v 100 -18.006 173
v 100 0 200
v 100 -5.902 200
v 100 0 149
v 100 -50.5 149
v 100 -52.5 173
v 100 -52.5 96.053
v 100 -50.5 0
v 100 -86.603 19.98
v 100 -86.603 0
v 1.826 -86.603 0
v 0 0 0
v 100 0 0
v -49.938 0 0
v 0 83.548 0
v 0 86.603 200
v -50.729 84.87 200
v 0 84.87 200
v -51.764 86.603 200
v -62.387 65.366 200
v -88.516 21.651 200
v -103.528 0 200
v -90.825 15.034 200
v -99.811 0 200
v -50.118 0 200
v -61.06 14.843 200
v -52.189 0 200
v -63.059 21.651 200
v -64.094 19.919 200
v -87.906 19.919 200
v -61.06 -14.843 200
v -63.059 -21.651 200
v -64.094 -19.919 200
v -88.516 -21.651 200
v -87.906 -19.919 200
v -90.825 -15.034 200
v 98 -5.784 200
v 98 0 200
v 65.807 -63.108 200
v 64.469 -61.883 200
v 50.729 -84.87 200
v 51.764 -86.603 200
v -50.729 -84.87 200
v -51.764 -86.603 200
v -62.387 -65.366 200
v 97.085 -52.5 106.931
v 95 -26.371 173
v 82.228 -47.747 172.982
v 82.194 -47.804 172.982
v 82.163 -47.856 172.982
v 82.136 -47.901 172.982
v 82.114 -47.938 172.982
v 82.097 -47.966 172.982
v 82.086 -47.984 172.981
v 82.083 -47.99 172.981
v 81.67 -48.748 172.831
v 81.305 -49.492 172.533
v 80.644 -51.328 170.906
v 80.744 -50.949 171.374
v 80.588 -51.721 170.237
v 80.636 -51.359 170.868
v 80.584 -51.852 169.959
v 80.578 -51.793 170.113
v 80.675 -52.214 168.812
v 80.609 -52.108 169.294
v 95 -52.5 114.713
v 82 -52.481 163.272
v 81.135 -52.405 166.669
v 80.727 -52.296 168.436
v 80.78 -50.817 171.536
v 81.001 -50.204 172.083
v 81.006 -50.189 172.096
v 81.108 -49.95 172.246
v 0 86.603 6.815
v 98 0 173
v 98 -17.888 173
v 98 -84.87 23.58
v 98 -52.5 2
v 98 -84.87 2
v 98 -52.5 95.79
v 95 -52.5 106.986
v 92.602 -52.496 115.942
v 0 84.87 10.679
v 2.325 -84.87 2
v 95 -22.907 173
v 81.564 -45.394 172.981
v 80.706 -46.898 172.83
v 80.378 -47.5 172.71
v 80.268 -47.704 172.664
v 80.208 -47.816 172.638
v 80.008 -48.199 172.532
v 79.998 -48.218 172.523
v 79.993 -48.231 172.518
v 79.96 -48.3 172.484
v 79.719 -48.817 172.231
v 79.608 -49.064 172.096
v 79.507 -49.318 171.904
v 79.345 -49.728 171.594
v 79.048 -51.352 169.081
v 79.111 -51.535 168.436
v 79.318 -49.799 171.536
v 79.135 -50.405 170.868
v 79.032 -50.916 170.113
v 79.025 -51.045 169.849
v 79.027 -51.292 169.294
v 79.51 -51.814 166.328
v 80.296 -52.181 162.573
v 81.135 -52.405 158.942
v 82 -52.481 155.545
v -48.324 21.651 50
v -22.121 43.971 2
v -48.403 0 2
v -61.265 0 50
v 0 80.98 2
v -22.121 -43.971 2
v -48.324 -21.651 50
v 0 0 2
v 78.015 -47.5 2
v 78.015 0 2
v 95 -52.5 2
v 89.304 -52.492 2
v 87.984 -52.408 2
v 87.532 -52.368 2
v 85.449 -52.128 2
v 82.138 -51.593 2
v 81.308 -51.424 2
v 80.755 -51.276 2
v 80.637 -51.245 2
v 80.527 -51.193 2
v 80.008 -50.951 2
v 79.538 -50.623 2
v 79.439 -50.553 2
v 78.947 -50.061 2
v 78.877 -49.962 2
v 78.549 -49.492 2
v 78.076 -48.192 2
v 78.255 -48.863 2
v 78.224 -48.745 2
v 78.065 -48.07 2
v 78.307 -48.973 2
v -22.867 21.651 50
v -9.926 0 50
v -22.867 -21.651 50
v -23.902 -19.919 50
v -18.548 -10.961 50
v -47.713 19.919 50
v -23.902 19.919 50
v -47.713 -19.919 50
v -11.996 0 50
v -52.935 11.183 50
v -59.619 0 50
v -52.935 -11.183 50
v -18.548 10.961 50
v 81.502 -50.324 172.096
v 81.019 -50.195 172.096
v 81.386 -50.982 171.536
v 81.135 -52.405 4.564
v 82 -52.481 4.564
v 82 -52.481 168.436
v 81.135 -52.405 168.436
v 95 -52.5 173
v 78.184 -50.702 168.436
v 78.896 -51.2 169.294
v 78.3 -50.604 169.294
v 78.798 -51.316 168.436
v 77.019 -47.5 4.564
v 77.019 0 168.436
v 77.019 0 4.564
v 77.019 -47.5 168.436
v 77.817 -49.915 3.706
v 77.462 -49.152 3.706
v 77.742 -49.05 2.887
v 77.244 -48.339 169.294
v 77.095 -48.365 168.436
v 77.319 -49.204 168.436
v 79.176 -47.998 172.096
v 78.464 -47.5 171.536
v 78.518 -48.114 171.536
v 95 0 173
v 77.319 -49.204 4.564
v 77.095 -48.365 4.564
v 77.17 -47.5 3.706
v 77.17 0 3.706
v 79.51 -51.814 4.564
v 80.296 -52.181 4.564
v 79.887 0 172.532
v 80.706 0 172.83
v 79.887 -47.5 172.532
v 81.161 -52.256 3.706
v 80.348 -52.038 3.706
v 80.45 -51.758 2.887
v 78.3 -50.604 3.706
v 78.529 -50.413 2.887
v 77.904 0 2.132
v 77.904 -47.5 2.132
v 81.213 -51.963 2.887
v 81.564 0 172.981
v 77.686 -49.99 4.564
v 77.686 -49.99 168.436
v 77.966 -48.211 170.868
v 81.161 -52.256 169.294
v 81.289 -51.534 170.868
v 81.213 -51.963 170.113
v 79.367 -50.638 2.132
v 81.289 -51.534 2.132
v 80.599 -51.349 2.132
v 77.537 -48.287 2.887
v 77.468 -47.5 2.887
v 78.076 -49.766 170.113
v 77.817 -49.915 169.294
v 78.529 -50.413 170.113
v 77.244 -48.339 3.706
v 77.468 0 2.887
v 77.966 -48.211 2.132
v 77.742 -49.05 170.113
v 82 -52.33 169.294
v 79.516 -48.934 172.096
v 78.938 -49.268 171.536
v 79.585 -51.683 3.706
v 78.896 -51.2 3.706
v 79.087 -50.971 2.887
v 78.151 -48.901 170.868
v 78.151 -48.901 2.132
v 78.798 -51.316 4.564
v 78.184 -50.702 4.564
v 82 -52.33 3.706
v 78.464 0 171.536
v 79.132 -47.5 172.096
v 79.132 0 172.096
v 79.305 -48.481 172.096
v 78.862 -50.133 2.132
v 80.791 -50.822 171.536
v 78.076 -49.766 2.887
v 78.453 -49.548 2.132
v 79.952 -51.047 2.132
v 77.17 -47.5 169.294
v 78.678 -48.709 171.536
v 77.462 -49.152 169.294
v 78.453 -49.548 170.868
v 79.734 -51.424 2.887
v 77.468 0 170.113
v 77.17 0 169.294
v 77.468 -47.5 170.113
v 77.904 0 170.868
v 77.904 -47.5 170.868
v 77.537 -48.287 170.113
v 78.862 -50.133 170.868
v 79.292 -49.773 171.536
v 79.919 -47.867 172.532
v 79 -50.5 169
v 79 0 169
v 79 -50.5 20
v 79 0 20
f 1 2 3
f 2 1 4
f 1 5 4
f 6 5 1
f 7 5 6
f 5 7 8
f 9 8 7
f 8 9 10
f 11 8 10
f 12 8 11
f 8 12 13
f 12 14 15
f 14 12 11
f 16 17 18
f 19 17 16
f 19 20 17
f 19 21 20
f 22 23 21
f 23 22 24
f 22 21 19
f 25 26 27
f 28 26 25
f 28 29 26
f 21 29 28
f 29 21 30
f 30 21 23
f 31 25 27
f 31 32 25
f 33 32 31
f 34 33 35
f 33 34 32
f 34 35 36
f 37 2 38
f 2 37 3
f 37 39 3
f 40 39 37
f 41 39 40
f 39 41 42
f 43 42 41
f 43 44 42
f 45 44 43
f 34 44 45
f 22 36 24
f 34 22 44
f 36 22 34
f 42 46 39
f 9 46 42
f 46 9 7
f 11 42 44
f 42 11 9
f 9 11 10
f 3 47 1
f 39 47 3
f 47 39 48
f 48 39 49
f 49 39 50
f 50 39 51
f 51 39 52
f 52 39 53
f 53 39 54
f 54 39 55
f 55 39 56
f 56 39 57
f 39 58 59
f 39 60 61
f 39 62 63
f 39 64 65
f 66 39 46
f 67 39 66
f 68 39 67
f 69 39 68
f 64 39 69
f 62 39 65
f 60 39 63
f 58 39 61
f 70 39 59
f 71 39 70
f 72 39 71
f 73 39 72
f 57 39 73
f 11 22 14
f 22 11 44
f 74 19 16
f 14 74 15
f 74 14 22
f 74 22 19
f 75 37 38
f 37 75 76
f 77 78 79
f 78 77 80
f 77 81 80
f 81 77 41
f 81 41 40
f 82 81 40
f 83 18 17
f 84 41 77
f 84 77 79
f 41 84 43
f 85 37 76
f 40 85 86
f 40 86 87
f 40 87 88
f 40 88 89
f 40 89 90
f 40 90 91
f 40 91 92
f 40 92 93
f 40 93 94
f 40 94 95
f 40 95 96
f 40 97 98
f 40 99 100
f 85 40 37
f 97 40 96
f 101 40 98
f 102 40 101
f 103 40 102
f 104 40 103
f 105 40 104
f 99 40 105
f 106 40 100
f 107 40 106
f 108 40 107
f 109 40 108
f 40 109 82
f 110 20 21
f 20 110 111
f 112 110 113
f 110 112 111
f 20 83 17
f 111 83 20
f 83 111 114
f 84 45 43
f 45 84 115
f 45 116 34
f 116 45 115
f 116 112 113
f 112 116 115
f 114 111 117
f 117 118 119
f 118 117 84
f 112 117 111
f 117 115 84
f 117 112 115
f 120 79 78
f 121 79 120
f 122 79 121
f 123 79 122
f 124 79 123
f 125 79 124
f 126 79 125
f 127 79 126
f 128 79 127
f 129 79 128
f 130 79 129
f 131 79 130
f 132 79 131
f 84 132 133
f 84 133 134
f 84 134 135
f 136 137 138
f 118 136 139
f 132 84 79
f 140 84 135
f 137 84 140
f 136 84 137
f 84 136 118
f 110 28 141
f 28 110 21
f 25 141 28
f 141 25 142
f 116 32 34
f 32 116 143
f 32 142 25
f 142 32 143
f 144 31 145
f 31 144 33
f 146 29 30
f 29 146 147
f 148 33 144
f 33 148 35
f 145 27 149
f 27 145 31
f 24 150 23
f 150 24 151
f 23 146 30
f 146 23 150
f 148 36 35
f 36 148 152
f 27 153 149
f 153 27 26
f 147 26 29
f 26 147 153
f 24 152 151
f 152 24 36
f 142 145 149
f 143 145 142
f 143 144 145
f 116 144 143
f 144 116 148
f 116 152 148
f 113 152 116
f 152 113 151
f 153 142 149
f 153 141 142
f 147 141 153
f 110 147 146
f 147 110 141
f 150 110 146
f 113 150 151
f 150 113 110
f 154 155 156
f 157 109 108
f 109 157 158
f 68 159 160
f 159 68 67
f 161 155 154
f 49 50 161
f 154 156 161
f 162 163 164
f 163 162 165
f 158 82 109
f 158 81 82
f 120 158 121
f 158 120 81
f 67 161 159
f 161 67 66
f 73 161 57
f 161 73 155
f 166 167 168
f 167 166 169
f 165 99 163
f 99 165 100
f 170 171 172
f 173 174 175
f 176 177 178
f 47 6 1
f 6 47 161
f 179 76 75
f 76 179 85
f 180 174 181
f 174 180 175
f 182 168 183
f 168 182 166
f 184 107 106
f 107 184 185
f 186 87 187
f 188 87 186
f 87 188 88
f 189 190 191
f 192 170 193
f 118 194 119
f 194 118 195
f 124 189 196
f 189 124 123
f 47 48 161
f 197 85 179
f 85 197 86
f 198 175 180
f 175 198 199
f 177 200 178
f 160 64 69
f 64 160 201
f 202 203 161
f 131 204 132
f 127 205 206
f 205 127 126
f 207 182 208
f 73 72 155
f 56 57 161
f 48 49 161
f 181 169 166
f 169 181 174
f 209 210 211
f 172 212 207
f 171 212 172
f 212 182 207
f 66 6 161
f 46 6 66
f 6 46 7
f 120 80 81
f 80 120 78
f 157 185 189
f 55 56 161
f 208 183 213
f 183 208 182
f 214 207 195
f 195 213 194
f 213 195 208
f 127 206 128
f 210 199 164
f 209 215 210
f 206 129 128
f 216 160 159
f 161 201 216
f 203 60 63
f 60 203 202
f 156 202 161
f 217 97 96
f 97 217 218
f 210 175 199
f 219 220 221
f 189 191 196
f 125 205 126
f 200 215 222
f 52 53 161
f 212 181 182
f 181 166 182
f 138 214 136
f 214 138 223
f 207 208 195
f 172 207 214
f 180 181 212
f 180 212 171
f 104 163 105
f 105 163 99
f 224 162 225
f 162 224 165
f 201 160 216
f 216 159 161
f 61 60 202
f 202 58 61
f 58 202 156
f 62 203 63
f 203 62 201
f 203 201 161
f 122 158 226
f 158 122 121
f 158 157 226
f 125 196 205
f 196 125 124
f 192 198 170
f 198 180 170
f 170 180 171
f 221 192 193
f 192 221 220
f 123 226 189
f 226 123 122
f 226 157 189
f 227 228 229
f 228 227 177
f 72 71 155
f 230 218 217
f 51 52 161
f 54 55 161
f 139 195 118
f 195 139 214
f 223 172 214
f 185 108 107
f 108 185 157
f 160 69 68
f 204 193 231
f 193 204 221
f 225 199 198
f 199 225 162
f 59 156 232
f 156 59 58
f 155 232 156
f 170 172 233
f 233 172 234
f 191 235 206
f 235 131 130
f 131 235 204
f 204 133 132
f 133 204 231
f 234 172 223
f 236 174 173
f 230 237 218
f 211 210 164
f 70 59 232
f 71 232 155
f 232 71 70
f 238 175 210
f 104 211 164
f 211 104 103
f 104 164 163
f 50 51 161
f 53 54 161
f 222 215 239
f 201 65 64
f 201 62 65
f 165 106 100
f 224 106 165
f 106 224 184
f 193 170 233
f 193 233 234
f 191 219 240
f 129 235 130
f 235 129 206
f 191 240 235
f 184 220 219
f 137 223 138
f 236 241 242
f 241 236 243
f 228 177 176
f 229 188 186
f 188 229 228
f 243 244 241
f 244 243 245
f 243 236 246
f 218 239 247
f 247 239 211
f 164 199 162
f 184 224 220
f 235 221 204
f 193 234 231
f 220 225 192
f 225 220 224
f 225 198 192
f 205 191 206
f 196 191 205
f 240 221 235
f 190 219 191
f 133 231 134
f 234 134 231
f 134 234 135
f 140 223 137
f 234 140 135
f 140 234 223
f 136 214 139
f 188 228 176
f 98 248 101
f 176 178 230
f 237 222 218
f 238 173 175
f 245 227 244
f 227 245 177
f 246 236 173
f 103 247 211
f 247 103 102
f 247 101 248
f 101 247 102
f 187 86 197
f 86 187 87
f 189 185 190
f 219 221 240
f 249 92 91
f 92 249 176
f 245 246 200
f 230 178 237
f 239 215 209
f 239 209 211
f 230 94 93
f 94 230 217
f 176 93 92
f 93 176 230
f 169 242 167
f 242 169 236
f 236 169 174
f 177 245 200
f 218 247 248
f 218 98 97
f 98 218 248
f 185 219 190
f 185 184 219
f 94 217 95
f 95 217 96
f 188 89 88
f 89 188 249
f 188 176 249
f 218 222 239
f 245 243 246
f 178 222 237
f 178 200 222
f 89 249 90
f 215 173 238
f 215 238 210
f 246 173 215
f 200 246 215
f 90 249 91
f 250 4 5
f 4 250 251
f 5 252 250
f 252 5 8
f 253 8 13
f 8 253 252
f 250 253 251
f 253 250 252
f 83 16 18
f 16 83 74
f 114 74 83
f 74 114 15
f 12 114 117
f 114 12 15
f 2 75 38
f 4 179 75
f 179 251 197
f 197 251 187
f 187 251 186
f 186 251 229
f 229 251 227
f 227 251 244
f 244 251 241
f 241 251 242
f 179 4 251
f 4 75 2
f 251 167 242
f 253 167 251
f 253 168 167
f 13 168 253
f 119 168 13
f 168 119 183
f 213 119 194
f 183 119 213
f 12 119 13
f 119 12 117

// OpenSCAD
height = 200;
radius = 200 / 2;
angle = 15;
wall = 2;
gap = 1;

mountHeight = 50;
mountWidth = 100;
mountDepth = 20;
mountOffset = 20;

wateringHoleRadius = 50 / 2;

waterBaseRadius = 50 / 2;
waterBaseHeight = 50;
waterBaseTransitionHeight = 50;
waterHolesRadius = 5;
numberOfHolesInRow = 12;
numberOfHoleRows = 3;
numberOfHorizontalHolesInRow = 6;
numberOfHorizontalHoleRows = 2;

numberOfScrews = 2;
screwRadius = 5 / 2;
screwHeadRadius = 6;
screwHeadHeight = 7;

finess = 36;

demo = true;

mountInnerWidth = mountWidth + wall * 2 + gap;
mountInnerDepth = mountDepth + wall + gap;
mountInnerHeight = mountHeight + wall + mountOffset + height / 2 + gap;

module base(radius) {
    translate([0, 0, height]) {
        rotate([180, 0, 0]) {
            intersection() {
                translate([-radius * 2, -radius, 0]) {
                    cube([radius * 3, radius * 2, height]);
                }
                rotate([0, angle, 0]) {
                    translate([0, 0, height * -1]) {
                        cylinder(height * 4, radius, radius, $fn = 6);
                    }
                }
            }
        }
    }
}

module roundedCube(x, y, z, r) {
    hull() {
        translate([-x/2 +r, -y/2 +r, r])
            sphere(r, $fn = finess);
        translate([x/2 -r, -y/2 +r, r])
            sphere(r, $fn = finess);
        translate([-x/2 +r, -y/2 +r, z - r])
            sphere(r, $fn = finess);
        translate([x/2 -r, -y/2 +r, z - r])
            sphere(r, $fn = finess);
        
        translate([-x/2, y/2 -r, 0])
            cube(r);
        translate([x/2 -r, y/2 -r, 0])
            cube(r);
        translate([-x/2, y/2 -r, z - r])
            cube(r);
        translate([x/2 -r, y/2 -r, z - r])
            cube(r);
        
    }
}

module mount(width, depth, height, offset) {
    rotate([0, 270, 90]) {
        linear_extrude(width) {
            polygon([[0,0], [offset, depth], [height + offset, depth], [height,0]]);
        }
    }
}

module screw(height) {
    cylinder(screwHeadHeight, screwHeadRadius, screwHeadRadius, $fn = finess);
    cylinder(height, screwRadius, screwRadius, $fn = finess);
}

module mountWithHoles() {
    translate([radius, mountWidth / 2, height / 2]) {
        difference() {
            color("blue") {
                mount(mountWidth, mountDepth, mountHeight, mountOffset);
            }
            for(i = [1:numberOfScrews]) {
                translate([-mountDepth, (mountWidth / (numberOfScrews + 1)) * -i, mountHeight / 2 + mountOffset / 2]) {
                    rotate([0, 90, 0]) {
                        screw(mountDepth);
                    }
                }
            }
        }
    }
}

module wateringHoleBase(radius, wateringHoleRadius) {
    translate([0, 0, height]) {
        rotate([180, 0, 0]) {
            intersection() {
                translate([-radius * 2, -radius, 0]) {
                    cube([radius * 3, radius * 2, height]);
                }
                rotate([0, angle, 0]) {
                    translate([0, 0, height * -1]) {
                        cylinder(height * 4, wateringHoleRadius, wateringHoleRadius, $fn = 6);
                    }
                }
            }
        }
    }
}

module wateringHole() {
    translate([wateringHoleRadius - radius - wall / 2, 0, 0]) {
        difference() {
            wateringHoleBase(radius, wateringHoleRadius);
            wateringHoleBase(radius, wateringHoleRadius - wall);
            cube([radius * 2, radius * 2, waterBaseHeight * 2], true);   
        }
    }
}

module saucer() {    
    difference() {
        union() {
            union() {
                difference() {
                    base(radius);
                    base(radius - wall);
                }
                intersection() {
                    base(radius);
                    cube([radius * 2, radius  * 2, wall * 2], true);
                }
            }
            
            translate([radius - mountInnerDepth / 2, 0, 0]) {
                rotate([0, 0, -90]) {
                    roundedCube(mountInnerWidth, mountInnerDepth, mountInnerHeight, 5);
                }
            }
            wateringHole();
        }
        translate([radius, mountWidth / 2 + gap /2, 0]) {
            mount(mountWidth + gap, mountDepth + gap, mountHeight + gap + height / 2 - wall, mountOffset);
        }
    }
}

module potBase(radius) {
    difference() {
        union() {
            difference() {
                base(radius);
                cube([radius * 3, radius * 3, (waterBaseHeight + waterBaseTransitionHeight) * 2], true);
            }
            intersection() {
                base(radius);
                union() {
                    cylinder(waterBaseHeight, waterBaseRadius, waterBaseRadius, $fn = finess);
                    translate([0, 0, waterBaseHeight]) {
                        cylinder(waterBaseTransitionHeight, waterBaseRadius, radius + 20, $fn = finess);
                    }
                }
            }
        }
        
        
    }
}

module pot() {
    toScale = (radius - wall) / radius; 
    holeCutOutHeight = waterBaseHeight + waterBaseTransitionHeight;
    union() {
        difference() {
            potBase(radius - wall - gap);
            translate([0, 0, wall]) {
                scale([toScale, toScale, 1]) {
                    potBase(radius - wall - gap);
                }
            }
            for(j = [1:numberOfHoleRows]) {
                offset = (radius - wall - waterBaseRadius - waterHolesRadius * 4) / numberOfHoleRows;
                for(i = [1:numberOfHolesInRow]) {
                    rotate([0, 0, (360 / numberOfHolesInRow * i)]) {
                        translate([0, waterBaseRadius + offset * j, 0]) {
                            cylinder(holeCutOutHeight, waterHolesRadius, waterHolesRadius);
                        }
                    }
                }
            }    
            for(j = [1:numberOfHorizontalHoleRows]) {
                offset = (waterBaseHeight - wall - waterHolesRadius * 2) / numberOfHorizontalHoleRows;
                for(i = [1:numberOfHorizontalHolesInRow]) {
                    rotate([90, 0, (360 / numberOfHorizontalHolesInRow * i)]) {
                        translate([0, offset * j, 0]) {
                            cylinder(holeCutOutHeight, waterHolesRadius, waterHolesRadius);
                        }
                    }
                }
            }  
            
        
            translate([radius - ((mountInnerDepth + gap +wall) / 2), 0, 0]) {
                rotate([0, 0, -90]) {
                    roundedCube(mountInnerWidth + gap + wall, mountInnerDepth + gap + wall, mountInnerHeight + gap + wall, 5);
                }
            }
            translate([wateringHoleRadius - radius, 0, 0]) {
                
                wateringHoleBase(radius, wateringHoleRadius + gap + wall);
            }
        }
        intersection() {
            potBase(radius - wall - gap);
            difference() {
                translate([radius - ((mountInnerDepth + gap +wall) / 2), 0, 0]) {
                    rotate([0, 0, -90]) {
                        roundedCube(mountInnerWidth + gap + wall, mountInnerDepth + gap + wall, mountInnerHeight + gap + wall, 5);
                    }
                }
                translate([radius - ((mountInnerDepth + gap) / 2), 0, 0]) {
                    rotate([0, 0, -90]) {
                        roundedCube(mountInnerWidth + gap, mountInnerDepth + gap, mountInnerHeight + gap, 5);
                    }
                }
            }
        }

        intersection() {
            potBase(radius - wall - gap);
            translate([wateringHoleRadius - radius, 0, 0]) {
                difference() {
                    wateringHoleBase(radius, wateringHoleRadius + gap + wall);
                    wateringHoleBase(radius, wateringHoleRadius + gap);
                }
            }
        }
    }    
}

if (demo) {
    difference() {
        saucer();
        cube([radius, radius, height]);
    }
    /*
    difference() {
        mountWithHoles();
        cube([radius, radius, height]);
    }
    difference() {
        translate([0, 0, wall]) {
            pot();
        }
        cube([radius, radius, height]);
    }
    */
} else {
    saucer();
    mountWithHoles();
    translate([0, 0, wall]) {
        pot();
    }    
}
